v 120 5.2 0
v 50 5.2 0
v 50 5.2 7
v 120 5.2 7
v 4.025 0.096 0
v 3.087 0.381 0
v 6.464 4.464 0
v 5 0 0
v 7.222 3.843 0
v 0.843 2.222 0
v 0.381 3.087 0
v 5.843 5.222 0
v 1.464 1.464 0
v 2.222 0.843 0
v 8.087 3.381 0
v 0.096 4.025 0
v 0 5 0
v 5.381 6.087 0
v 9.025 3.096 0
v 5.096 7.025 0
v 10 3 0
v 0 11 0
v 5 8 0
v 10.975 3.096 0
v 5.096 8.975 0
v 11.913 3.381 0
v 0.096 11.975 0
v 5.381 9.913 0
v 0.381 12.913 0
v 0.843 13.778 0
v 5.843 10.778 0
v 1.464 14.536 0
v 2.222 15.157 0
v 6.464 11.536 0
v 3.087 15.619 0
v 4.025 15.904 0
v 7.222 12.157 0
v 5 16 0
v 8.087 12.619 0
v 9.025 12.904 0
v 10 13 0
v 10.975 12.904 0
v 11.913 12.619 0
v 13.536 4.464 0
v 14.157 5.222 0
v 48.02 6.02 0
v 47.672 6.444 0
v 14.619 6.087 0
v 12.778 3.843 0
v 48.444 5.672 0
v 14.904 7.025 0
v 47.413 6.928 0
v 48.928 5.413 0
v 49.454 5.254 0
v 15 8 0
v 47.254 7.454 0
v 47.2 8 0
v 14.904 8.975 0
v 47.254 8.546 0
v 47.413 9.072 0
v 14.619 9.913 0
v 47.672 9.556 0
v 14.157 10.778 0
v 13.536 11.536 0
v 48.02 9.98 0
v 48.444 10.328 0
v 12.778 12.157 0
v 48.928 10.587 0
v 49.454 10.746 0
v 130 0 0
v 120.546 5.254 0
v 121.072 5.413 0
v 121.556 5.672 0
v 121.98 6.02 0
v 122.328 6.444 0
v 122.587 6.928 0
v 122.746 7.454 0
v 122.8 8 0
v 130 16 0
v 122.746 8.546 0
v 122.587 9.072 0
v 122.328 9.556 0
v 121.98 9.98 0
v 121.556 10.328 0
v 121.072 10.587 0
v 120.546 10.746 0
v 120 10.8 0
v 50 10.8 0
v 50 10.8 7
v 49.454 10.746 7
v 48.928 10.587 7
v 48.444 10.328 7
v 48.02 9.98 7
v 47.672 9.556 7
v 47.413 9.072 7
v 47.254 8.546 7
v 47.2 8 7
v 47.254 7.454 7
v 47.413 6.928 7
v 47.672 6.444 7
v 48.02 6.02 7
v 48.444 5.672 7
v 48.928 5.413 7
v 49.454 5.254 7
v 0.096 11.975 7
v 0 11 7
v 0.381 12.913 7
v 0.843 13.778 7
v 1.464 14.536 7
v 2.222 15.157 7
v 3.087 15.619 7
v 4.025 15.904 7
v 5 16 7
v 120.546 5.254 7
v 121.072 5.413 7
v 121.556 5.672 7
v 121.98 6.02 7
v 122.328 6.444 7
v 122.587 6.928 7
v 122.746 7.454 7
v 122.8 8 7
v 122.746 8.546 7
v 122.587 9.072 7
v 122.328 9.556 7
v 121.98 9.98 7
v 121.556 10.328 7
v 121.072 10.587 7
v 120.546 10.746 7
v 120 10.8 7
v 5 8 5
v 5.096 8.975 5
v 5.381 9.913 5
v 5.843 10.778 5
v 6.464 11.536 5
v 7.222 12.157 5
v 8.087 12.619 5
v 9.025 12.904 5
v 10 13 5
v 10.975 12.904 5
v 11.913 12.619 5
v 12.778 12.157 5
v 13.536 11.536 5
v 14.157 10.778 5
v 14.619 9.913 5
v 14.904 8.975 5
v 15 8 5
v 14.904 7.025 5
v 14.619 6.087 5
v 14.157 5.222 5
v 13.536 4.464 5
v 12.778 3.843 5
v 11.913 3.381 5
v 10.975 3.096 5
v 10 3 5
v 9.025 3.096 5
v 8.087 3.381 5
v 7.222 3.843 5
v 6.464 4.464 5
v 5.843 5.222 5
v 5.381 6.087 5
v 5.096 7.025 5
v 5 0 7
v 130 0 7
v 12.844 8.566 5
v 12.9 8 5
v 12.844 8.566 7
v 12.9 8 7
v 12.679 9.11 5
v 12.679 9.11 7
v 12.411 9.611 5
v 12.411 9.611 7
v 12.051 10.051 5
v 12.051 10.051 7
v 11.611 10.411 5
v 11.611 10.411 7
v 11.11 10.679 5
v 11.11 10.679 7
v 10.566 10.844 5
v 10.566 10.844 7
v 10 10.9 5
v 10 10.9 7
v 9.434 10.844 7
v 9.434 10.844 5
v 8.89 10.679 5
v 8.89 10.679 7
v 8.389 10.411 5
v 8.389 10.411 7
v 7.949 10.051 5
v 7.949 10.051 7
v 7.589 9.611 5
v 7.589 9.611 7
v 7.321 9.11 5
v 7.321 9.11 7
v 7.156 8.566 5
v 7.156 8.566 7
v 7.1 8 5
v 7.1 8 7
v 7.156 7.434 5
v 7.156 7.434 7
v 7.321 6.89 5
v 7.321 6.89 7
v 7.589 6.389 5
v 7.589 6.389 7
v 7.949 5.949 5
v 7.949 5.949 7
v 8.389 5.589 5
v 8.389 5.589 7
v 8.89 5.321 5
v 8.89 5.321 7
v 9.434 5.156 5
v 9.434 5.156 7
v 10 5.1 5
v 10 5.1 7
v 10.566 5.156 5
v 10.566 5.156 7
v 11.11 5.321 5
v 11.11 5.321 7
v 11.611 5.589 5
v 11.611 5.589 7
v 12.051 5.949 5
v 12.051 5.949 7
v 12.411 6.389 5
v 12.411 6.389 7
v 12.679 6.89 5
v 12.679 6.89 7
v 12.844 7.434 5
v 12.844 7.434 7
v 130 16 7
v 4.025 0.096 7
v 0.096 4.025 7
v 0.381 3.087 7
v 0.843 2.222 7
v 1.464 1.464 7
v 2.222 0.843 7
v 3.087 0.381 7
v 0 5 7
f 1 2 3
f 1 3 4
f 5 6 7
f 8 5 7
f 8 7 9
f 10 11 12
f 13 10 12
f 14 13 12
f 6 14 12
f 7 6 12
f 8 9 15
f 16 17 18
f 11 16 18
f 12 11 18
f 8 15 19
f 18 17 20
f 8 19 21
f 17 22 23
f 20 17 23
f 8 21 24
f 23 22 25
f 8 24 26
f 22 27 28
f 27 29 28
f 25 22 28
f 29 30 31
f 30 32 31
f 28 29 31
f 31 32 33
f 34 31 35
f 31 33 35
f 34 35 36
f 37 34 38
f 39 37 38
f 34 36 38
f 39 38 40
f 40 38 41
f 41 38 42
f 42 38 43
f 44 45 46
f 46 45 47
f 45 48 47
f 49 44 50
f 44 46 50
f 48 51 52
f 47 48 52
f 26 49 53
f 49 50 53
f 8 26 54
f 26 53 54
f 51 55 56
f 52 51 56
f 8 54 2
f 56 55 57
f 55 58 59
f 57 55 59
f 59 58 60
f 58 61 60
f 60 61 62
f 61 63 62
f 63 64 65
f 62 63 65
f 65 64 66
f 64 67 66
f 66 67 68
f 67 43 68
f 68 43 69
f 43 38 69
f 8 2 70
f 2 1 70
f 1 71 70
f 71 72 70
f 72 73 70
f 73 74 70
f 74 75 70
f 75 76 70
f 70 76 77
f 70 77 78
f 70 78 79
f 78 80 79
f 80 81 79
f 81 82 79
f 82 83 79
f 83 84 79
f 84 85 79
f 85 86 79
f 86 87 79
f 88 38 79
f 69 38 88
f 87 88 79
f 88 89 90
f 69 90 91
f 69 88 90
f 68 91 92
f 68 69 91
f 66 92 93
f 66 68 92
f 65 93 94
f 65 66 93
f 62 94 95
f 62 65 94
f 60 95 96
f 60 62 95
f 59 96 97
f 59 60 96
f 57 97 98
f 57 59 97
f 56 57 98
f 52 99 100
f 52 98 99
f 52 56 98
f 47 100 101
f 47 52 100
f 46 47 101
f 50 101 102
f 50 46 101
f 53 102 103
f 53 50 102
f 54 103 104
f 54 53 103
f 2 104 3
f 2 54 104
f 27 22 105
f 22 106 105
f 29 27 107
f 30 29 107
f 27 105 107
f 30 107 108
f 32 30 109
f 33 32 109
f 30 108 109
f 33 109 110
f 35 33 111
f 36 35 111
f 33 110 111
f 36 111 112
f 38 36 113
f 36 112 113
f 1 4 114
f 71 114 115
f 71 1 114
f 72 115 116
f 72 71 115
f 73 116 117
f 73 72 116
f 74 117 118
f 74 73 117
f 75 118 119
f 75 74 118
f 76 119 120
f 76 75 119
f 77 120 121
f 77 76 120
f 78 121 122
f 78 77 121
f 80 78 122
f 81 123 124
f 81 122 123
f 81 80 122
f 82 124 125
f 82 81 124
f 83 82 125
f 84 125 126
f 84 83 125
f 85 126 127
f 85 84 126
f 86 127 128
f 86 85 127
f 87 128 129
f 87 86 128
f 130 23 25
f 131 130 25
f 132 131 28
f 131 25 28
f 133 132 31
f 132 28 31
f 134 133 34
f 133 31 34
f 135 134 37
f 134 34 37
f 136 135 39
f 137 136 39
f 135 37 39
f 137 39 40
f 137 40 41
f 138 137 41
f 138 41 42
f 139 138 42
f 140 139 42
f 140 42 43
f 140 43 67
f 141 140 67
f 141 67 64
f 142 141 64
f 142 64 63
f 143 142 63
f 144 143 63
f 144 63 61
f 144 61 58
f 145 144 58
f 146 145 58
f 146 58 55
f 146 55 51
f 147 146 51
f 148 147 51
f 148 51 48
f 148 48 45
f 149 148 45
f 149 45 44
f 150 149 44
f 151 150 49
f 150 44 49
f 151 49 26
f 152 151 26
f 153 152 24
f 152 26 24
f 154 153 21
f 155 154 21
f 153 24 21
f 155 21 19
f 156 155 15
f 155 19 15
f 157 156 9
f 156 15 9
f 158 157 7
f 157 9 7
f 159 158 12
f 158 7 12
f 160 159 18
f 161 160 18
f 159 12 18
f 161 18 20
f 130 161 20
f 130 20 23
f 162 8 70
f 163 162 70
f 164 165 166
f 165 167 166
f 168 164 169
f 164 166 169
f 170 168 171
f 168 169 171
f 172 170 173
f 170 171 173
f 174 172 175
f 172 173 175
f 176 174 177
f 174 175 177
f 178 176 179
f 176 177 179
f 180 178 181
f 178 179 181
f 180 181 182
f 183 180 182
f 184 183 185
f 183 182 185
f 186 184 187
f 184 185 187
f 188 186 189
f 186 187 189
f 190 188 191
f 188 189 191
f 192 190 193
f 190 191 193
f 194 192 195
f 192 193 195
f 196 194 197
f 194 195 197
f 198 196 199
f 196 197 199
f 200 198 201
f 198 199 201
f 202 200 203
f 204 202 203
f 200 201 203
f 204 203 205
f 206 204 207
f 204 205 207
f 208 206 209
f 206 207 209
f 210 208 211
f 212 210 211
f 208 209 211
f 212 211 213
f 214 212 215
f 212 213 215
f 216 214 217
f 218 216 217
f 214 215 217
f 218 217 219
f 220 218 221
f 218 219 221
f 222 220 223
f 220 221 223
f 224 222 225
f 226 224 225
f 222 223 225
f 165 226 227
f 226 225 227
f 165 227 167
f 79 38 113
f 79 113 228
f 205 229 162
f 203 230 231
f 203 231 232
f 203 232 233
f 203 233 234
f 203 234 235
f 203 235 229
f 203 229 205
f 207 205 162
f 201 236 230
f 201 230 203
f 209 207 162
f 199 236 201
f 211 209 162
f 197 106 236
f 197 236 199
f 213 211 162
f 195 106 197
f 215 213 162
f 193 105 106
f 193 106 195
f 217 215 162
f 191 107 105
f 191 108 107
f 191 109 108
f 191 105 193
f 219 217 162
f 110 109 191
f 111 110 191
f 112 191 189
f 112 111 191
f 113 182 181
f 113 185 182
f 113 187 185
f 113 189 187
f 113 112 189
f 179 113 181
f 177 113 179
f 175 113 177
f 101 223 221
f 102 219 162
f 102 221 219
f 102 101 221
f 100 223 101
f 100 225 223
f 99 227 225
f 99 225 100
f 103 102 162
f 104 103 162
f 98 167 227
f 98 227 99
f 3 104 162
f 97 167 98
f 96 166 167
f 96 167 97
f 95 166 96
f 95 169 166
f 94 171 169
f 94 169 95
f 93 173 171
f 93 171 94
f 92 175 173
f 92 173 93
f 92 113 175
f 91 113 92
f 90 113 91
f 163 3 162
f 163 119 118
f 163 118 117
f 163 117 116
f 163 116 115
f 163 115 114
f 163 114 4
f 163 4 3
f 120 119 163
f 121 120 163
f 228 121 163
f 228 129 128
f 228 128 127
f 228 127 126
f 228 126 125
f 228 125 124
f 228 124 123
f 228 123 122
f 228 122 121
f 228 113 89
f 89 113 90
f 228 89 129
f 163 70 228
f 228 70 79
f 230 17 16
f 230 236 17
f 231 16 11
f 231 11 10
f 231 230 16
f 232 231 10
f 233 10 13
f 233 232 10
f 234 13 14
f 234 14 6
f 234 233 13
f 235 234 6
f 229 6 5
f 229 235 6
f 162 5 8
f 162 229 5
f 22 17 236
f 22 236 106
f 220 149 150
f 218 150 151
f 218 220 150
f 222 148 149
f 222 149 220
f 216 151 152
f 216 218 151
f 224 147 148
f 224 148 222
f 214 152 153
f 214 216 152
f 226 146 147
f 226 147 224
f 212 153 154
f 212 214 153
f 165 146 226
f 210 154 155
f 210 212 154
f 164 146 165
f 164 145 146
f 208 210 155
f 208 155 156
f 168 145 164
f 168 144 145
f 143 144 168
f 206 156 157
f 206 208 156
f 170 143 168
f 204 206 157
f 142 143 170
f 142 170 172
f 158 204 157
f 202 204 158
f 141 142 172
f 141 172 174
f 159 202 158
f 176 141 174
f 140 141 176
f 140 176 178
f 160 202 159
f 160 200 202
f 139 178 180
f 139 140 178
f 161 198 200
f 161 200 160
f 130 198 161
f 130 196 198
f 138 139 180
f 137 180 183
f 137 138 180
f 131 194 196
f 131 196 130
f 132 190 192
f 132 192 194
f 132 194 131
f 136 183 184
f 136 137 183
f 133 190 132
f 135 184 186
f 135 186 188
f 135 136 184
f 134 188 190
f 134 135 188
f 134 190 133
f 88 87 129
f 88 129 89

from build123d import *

# Parameters (mm, degrees)
SKETCH_1_W                   = 130
SKETCH_1_H                   = 16
EXTRUDE_1_DEPTH              = 7
HOLE_WIZARD_M5_1_D           = 5.8
HOLE_WIZARD_M5_1_CBORE_D     = 10
HOLE_WIZARD_M5_1_CBORE_DEPTH = 5
FILLET_1_R                   = 5
CUT_EXTRUDE_1_DEPTH          = 132.167831422


with BuildPart() as part:
    # 草图1 → 凸台-拉伸1 (new body)
    with BuildSketch(Plane.XY):
        with Locations((65, 8)):
            Rectangle(SKETCH_1_W, SKETCH_1_H)
    extrude(amount=EXTRUDE_1_DEPTH)

    # M5 六角凹头螺钉的柱形沉头孔1 (through all)
    with Locations(Plane(origin=(0, 0, 0), x_dir=(-1, 0, 0), z_dir=(0, 0, -1))):
        with Locations((-10, 8)):
            CounterBoreHole(HOLE_WIZARD_M5_1_D / 2, HOLE_WIZARD_M5_1_CBORE_D / 2, HOLE_WIZARD_M5_1_CBORE_DEPTH)

    # 圆角1
    fillet_1_edges = [part.edges().sort_by_distance(p)[0] for p in [
        (0, 16, 3.5),
        (0, 0, 3.5),
    ]]
    fillet(fillet_1_edges, radius=FILLET_1_R)

    # 草图4 → 切除-拉伸1 (cut, through all)
    with BuildSketch(Plane(origin=(0, 0, 0), x_dir=(-1, 0, 0), z_dir=(0, 0, -1))):
        with BuildLine():
            Line((-50, 5.2), (-120, 5.2))
            ThreePointArc((-120, 5.2), (-122.8, 8), (-120, 10.8))
            Line((-120, 10.8), (-50, 10.8))
            ThreePointArc((-50, 10.8), (-47.2, 8), (-50, 5.2))
        make_face()
    extrude(amount=-CUT_EXTRUDE_1_DEPTH, mode=Mode.SUBTRACT)


solid = part.part
